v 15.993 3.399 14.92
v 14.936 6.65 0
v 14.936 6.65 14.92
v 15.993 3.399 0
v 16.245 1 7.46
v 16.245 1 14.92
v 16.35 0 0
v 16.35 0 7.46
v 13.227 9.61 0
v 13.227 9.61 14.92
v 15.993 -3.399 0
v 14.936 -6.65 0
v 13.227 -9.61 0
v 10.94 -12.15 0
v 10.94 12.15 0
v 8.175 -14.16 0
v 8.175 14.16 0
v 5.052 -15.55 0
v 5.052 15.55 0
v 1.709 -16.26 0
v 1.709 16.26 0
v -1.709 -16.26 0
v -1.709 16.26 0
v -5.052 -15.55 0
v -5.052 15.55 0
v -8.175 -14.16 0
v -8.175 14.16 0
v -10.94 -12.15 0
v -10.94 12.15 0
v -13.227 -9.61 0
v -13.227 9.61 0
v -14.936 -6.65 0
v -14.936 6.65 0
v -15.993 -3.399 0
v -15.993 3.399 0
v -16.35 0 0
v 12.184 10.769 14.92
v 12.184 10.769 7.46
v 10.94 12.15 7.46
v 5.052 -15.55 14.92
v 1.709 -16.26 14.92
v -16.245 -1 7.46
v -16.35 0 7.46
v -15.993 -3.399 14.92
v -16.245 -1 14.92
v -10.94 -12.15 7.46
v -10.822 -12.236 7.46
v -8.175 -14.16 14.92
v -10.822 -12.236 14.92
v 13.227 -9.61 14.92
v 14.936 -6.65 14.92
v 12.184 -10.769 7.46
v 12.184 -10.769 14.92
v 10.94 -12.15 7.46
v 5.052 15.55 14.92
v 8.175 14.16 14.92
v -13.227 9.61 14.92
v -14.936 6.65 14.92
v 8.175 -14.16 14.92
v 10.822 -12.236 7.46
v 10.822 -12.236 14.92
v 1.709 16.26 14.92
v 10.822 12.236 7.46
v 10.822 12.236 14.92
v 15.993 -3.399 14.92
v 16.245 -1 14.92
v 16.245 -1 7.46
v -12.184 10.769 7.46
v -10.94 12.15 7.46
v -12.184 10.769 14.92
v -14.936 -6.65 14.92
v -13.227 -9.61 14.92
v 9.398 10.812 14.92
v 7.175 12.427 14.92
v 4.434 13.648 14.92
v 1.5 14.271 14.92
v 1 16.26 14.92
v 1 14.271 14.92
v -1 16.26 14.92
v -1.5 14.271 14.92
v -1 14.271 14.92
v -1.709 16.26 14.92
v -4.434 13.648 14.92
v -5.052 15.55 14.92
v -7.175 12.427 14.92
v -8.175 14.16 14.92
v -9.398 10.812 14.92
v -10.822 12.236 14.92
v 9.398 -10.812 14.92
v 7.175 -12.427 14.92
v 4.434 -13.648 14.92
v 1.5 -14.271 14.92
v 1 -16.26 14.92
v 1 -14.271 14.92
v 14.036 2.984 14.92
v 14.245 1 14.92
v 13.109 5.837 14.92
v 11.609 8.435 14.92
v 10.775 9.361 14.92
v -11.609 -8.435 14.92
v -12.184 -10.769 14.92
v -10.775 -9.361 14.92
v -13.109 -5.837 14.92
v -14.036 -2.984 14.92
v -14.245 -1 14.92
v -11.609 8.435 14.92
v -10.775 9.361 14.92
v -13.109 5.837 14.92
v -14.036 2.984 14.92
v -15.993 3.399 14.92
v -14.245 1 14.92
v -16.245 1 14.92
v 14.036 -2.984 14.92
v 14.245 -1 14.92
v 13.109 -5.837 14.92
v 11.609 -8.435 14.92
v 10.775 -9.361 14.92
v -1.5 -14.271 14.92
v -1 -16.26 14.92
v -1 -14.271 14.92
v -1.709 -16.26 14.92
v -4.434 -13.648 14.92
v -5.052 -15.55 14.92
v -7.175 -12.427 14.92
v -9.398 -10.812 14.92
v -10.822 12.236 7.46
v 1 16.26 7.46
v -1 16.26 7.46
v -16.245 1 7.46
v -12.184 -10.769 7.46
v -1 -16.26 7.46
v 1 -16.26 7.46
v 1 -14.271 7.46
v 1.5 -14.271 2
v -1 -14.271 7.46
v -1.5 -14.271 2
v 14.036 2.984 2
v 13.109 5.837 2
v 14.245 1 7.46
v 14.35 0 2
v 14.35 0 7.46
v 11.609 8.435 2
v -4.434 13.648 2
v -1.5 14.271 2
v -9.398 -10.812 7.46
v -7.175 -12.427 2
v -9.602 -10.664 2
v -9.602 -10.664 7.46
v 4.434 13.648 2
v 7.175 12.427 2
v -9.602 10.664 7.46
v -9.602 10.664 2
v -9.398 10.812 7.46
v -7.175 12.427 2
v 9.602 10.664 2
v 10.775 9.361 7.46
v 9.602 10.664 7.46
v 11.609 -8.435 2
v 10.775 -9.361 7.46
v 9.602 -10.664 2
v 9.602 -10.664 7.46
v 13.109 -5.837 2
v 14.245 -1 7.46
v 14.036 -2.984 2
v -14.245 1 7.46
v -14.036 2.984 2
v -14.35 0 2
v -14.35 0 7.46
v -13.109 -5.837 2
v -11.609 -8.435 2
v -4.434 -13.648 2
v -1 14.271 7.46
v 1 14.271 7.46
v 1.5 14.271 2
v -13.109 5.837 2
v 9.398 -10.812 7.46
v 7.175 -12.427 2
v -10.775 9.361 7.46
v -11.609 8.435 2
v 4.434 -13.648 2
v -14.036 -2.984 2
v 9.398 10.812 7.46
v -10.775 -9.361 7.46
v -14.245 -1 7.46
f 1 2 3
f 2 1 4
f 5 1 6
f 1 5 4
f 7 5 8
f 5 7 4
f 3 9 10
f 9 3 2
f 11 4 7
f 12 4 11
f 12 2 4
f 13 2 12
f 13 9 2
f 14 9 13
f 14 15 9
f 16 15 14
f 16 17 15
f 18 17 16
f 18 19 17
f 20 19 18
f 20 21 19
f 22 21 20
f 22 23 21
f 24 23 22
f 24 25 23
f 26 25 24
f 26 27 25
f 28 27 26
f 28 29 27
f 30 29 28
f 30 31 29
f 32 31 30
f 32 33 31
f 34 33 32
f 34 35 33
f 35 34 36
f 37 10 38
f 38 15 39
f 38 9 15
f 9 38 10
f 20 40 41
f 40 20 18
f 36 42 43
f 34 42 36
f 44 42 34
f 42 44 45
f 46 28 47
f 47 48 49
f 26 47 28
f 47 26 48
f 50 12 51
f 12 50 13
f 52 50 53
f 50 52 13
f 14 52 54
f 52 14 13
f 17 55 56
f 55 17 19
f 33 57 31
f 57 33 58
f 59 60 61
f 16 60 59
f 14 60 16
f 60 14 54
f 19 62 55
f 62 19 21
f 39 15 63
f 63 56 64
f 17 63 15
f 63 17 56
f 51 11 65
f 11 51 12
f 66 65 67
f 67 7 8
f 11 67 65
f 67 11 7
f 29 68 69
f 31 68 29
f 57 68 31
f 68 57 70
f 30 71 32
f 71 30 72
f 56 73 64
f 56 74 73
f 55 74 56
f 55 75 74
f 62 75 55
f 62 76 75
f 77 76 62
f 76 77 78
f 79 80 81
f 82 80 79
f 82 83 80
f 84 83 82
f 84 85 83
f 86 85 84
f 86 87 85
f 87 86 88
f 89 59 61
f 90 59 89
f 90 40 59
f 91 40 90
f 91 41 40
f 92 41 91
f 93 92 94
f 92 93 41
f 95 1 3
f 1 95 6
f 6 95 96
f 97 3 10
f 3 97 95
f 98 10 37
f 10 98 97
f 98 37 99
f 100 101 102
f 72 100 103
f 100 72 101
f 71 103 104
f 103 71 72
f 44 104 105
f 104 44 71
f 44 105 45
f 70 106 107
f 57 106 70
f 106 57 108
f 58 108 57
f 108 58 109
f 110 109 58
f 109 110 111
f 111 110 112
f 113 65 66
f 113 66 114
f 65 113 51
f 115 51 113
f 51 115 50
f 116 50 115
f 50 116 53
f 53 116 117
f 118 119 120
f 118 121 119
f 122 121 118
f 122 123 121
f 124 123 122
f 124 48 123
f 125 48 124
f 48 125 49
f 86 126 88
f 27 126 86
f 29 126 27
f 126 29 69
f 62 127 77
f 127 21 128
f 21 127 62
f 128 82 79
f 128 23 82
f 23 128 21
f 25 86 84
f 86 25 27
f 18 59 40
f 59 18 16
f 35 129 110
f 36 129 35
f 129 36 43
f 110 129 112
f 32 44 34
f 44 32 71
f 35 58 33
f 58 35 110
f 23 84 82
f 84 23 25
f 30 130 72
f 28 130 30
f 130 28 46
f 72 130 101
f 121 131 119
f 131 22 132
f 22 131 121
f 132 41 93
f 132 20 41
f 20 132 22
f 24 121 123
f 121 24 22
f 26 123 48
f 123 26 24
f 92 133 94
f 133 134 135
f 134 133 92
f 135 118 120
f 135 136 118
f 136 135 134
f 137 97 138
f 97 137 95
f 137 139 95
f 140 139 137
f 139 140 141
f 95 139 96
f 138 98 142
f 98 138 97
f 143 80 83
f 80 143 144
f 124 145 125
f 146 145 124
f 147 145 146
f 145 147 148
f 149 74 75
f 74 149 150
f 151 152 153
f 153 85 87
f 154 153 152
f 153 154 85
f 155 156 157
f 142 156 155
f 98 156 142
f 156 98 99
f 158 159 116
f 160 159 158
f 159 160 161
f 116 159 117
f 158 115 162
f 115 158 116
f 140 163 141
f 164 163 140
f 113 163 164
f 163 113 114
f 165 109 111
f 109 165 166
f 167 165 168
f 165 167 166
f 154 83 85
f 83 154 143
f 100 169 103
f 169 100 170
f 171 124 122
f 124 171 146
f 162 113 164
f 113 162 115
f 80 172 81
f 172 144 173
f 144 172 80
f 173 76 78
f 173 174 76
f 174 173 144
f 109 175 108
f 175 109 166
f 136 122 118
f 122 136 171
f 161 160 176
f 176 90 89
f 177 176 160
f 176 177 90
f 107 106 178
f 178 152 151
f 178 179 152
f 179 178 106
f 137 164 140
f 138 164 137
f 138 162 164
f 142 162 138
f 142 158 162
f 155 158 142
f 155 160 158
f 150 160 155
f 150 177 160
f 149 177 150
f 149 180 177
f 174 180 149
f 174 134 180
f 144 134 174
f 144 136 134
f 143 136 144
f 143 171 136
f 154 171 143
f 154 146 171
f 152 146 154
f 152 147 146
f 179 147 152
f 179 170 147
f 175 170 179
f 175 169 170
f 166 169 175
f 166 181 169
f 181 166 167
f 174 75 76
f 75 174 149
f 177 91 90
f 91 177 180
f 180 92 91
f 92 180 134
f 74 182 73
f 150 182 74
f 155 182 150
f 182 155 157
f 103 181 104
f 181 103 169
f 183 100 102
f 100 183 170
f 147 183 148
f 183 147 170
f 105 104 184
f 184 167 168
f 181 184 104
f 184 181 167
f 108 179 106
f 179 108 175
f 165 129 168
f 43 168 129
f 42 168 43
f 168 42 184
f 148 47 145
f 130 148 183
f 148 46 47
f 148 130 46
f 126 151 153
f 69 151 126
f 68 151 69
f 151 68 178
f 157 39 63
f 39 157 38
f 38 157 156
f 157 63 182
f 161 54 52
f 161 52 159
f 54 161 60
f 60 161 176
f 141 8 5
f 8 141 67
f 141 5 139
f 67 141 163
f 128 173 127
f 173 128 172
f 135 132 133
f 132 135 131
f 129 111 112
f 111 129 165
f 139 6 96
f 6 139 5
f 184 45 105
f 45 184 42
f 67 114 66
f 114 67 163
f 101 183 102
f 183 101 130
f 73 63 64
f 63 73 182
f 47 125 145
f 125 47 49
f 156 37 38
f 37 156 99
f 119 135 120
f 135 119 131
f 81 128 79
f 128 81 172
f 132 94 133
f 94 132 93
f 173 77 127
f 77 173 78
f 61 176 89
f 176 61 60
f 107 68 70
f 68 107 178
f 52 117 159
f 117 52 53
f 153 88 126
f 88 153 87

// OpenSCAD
// attacknid neck cap
// by knarfishness for dieselpoweredrobotics.com

od_circle = 28.7;
id_circle =  25.75;
depth_to_fins = 7.46;
whole_depth = 14.92;
fin_width = 2;

shell_thickness = 2;
i_tolerance = 0;


module outer_shell()
{
	cylinder(whole_depth, od_circle/2+shell_thickness, od_circle/2+shell_thickness);
}


module inner_shell()
{
	translate([0,0,shell_thickness])
	cylinder(whole_depth, od_circle/2-i_tolerance, od_circle/2-i_tolerance);
}

module finset()
{
	translate([0,0,whole_depth-(depth_to_fins/2)])
	cube([100,fin_width,whole_depth-depth_to_fins], true);

	rotate(45,0,0)
	translate([0,0,whole_depth-(depth_to_fins/2)])
	cube([100,fin_width,whole_depth-depth_to_fins], true);
}

module fins()
{
	finset();
	rotate(90,0,0)
	finset();
}

module cap()
{
	difference()
	{
		outer_shell();
		inner_shell();
	}
}

difference()
{
	cap();
	fins();
}
